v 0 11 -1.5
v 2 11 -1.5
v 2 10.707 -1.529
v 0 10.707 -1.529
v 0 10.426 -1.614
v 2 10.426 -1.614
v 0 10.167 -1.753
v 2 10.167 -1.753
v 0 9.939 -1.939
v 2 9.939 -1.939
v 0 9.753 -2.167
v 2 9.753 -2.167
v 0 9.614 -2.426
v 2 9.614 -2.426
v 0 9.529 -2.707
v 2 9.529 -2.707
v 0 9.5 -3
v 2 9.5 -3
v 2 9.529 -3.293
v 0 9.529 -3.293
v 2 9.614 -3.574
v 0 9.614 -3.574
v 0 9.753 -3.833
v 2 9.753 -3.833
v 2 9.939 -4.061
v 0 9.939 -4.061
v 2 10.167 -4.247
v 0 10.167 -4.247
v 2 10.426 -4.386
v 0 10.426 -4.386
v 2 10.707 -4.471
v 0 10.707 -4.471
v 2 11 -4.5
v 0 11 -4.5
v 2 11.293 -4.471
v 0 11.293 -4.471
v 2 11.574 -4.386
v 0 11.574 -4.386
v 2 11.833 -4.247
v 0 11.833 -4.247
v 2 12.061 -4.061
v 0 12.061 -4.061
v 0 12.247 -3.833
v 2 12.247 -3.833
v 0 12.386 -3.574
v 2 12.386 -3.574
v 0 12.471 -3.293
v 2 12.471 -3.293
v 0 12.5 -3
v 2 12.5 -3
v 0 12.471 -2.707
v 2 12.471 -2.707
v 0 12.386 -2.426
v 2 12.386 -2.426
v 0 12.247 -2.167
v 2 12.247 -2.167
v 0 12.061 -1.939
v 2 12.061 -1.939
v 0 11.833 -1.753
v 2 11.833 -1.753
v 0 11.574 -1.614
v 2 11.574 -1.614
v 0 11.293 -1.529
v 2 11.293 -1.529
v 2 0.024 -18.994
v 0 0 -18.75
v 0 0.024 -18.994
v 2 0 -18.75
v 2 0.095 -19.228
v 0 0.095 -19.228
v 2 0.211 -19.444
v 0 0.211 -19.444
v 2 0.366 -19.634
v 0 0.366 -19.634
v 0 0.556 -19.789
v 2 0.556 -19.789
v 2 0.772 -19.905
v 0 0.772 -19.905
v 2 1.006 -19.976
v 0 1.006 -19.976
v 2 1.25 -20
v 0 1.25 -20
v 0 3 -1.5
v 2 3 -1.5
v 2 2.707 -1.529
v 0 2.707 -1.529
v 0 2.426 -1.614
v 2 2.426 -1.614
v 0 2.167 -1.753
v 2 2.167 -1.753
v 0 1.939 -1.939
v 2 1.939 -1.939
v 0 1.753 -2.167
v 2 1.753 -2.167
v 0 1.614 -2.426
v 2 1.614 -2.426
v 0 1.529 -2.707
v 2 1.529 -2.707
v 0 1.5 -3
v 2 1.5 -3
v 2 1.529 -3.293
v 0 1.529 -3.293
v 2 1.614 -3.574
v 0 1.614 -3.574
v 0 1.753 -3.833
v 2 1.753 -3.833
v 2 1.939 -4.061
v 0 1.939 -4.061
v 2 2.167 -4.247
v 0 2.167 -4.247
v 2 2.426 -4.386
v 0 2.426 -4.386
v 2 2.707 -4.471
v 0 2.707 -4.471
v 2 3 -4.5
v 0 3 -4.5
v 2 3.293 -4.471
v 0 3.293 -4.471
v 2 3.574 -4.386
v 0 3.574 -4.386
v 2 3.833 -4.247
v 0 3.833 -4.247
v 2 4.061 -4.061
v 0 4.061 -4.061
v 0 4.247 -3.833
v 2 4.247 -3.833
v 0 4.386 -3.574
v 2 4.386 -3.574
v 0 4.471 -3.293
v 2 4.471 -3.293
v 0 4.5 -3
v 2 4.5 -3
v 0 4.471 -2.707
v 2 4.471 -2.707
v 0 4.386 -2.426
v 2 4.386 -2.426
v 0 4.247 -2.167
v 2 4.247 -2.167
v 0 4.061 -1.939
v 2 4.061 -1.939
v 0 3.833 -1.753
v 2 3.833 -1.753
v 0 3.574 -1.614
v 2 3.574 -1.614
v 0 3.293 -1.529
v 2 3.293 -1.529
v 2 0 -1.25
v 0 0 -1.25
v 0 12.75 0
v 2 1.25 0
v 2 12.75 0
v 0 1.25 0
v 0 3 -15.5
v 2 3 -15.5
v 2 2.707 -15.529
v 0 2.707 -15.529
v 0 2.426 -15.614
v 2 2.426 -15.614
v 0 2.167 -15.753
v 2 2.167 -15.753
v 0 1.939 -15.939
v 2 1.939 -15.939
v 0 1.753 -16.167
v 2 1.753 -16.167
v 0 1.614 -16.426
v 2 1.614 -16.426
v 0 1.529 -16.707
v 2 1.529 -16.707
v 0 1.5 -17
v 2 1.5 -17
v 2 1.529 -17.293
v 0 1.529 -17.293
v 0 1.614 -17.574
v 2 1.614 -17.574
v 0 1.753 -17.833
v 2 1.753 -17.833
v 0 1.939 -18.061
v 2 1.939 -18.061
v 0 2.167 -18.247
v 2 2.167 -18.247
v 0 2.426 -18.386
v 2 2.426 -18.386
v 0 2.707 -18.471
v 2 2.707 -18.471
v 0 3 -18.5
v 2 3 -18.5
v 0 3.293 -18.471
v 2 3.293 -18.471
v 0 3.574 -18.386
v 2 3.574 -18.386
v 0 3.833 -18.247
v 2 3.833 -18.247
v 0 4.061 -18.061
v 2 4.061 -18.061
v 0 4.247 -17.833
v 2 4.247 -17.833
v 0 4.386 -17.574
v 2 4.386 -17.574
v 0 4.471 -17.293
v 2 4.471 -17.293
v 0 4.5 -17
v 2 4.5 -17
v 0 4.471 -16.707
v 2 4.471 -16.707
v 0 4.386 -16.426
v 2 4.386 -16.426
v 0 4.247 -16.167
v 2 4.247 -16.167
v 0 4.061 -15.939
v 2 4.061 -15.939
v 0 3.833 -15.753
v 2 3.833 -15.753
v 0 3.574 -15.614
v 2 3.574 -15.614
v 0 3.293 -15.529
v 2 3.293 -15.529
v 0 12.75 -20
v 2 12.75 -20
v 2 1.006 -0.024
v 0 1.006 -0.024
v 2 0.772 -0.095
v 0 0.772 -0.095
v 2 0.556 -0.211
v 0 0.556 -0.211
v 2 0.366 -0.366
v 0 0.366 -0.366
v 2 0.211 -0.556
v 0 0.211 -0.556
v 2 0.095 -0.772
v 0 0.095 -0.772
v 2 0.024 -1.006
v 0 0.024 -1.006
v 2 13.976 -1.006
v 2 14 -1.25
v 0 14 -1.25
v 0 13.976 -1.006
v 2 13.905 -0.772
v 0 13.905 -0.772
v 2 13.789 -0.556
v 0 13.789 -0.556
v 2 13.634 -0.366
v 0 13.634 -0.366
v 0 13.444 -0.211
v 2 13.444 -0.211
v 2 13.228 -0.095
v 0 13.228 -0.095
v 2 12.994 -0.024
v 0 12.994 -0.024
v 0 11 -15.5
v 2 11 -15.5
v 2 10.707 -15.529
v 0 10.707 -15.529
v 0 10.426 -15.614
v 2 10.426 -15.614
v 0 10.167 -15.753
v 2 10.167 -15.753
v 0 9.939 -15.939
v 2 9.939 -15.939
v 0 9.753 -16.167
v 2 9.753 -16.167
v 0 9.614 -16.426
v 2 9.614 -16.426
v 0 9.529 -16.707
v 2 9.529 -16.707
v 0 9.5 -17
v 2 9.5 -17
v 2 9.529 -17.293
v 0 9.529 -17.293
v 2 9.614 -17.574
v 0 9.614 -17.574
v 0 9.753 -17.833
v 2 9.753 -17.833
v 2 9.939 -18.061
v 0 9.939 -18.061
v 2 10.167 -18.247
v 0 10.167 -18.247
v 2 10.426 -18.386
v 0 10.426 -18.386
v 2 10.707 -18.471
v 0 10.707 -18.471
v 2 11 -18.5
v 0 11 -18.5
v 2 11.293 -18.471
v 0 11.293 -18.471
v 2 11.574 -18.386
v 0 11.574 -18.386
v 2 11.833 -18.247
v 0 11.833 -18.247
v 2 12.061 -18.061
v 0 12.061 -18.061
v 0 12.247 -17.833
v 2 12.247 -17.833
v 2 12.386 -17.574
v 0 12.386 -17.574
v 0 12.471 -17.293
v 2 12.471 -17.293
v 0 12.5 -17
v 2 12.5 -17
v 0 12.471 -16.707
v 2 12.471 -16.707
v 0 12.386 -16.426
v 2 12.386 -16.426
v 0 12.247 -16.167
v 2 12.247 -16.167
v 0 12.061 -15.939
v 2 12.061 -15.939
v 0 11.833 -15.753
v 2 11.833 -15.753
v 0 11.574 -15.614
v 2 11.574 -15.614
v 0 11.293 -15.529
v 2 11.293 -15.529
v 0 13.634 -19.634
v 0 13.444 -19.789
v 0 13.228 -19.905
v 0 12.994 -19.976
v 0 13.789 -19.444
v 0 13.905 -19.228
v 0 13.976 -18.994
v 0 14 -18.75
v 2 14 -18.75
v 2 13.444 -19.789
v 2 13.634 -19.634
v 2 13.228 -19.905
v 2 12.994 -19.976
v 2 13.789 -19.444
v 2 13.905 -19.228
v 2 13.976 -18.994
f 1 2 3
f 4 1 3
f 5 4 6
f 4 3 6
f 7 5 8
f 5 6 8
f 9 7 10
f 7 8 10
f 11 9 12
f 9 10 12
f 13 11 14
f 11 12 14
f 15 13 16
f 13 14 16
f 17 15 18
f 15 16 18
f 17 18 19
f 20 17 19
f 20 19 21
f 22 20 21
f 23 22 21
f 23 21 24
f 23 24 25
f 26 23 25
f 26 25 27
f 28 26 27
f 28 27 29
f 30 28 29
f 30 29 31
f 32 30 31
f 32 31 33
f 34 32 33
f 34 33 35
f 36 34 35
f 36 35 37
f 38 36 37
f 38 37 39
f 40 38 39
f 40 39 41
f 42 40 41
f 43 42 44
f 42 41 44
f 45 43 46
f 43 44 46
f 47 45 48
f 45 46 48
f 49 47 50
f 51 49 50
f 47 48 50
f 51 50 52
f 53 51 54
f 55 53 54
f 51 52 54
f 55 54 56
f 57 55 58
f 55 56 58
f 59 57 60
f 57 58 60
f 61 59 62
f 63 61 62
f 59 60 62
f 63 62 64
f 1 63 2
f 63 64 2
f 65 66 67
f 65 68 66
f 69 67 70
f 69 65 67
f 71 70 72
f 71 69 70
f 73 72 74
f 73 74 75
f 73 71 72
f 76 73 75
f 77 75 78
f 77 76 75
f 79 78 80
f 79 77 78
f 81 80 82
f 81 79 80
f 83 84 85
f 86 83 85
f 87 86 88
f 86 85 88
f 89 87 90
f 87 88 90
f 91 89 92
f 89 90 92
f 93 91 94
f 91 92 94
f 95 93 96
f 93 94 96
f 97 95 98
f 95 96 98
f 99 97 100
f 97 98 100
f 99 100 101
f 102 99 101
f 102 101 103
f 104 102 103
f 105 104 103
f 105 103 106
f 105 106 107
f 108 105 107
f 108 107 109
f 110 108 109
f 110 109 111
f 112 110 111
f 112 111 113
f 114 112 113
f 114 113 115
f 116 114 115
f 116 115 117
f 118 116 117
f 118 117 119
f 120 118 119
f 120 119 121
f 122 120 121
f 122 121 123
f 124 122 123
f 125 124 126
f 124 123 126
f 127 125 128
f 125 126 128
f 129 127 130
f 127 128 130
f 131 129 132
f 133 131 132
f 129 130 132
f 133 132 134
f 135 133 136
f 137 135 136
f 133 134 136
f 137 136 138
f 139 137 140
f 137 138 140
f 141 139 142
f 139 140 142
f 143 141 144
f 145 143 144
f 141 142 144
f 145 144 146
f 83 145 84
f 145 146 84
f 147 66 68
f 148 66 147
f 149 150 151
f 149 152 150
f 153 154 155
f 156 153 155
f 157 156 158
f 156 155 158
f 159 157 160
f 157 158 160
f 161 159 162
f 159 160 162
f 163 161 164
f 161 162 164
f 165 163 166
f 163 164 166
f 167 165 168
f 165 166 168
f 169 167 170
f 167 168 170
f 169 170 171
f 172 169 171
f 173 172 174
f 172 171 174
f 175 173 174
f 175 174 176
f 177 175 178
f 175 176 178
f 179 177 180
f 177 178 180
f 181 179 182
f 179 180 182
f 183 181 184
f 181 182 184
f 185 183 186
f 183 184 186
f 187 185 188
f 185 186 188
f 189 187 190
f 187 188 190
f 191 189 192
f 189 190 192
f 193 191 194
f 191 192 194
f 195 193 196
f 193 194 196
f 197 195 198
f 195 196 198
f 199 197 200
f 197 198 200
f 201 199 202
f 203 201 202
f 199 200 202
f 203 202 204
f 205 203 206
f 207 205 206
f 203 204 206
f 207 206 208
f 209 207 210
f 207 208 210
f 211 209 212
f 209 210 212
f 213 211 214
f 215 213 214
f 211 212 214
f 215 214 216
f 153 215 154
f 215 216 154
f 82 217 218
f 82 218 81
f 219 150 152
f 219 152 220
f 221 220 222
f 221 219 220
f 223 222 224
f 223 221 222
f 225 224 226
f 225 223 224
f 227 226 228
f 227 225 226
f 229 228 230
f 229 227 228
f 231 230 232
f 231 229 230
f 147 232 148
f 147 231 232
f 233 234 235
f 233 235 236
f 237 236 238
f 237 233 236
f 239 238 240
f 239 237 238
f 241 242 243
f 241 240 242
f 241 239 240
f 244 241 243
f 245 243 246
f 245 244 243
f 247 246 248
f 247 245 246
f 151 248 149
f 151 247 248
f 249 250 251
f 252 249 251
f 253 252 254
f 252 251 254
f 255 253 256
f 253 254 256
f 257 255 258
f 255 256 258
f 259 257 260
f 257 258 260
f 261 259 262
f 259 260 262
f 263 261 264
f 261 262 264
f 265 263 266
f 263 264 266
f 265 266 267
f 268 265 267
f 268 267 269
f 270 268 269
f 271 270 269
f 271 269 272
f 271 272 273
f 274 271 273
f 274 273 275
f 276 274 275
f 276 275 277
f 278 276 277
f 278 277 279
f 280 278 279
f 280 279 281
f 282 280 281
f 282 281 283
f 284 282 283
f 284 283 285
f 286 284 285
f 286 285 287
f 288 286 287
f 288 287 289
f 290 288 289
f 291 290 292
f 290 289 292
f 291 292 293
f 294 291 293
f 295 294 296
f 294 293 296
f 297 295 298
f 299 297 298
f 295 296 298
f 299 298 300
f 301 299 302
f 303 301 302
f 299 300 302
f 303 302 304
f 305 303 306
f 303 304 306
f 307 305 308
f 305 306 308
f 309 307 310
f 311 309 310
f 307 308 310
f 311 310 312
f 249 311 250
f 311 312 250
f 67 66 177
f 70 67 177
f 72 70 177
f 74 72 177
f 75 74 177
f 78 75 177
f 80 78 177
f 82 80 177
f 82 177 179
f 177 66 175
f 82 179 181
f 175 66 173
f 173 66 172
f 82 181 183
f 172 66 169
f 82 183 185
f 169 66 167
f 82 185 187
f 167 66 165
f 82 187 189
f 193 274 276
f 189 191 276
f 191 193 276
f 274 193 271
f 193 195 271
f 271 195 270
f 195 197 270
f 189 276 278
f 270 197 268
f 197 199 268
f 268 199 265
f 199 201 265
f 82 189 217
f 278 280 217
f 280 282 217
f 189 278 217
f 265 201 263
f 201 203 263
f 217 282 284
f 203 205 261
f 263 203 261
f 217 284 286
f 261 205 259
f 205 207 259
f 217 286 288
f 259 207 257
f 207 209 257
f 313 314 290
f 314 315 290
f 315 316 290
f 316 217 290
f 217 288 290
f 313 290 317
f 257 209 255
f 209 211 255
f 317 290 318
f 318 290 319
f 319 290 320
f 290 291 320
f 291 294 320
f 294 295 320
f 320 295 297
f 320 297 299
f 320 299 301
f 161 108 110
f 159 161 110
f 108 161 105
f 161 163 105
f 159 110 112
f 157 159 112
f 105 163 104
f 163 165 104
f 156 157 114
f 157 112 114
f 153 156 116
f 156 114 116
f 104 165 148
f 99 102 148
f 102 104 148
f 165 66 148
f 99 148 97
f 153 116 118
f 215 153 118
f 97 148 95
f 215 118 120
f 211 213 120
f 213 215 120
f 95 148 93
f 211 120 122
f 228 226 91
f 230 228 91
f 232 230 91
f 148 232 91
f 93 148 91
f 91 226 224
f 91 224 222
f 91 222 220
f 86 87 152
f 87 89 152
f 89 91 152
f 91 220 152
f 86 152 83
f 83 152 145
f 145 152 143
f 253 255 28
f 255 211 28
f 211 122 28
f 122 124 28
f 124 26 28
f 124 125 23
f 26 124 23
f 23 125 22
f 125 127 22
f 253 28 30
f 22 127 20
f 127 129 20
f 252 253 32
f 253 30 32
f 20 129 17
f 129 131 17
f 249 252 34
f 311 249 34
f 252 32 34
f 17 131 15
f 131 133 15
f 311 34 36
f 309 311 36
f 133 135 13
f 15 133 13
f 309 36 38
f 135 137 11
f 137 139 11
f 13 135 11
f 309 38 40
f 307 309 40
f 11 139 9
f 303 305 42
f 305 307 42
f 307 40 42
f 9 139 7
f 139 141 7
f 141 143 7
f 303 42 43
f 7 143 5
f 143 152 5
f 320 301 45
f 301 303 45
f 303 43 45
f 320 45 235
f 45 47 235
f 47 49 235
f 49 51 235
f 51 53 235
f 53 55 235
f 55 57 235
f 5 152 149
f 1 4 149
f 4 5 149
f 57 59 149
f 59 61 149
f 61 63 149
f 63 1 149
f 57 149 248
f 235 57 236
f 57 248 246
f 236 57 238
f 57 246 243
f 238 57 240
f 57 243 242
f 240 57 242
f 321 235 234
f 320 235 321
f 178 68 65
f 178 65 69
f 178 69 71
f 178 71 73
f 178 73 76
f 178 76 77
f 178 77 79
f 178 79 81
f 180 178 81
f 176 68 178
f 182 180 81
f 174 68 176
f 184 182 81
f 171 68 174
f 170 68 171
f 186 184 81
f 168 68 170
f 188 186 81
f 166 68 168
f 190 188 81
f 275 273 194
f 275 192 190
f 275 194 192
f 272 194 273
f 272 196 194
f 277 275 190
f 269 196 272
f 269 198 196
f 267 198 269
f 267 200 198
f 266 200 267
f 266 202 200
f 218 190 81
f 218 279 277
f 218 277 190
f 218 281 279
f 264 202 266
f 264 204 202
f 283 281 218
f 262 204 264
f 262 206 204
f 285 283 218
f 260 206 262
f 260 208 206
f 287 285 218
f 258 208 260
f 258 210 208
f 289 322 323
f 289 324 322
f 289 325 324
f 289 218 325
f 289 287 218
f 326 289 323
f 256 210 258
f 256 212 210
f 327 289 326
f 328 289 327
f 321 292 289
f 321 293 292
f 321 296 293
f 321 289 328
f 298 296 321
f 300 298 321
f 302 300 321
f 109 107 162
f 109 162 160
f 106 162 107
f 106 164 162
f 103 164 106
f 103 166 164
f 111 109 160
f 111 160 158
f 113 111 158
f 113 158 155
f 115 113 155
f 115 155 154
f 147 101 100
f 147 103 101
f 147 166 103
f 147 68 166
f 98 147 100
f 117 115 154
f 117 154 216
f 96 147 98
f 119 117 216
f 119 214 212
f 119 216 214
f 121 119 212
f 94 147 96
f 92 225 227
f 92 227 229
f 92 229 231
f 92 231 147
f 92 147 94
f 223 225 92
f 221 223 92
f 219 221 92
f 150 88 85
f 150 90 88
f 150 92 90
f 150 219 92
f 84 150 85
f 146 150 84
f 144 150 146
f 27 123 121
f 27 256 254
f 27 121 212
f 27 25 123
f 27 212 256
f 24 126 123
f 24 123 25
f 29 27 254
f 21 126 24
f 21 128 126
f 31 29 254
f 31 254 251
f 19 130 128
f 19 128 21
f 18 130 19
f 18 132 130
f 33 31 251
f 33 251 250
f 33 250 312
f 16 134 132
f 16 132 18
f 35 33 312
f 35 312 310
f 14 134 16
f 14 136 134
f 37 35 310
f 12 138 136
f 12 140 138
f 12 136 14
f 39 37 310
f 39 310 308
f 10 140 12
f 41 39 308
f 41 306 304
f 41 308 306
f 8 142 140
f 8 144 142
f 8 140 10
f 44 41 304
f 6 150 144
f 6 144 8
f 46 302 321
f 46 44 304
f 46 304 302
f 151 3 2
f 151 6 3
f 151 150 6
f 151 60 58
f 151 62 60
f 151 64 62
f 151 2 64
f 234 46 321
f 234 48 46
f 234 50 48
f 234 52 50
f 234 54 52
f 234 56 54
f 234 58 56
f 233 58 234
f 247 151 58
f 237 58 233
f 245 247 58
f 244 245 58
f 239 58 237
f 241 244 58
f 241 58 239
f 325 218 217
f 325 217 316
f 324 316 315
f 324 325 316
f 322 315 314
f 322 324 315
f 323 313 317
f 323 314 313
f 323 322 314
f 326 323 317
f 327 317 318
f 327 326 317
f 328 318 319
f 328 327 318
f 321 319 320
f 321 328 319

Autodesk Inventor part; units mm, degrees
ref_plane "YZ Plane" through (0, 0, 0) normal (1, 0, 0) x (0, 1, 0)
ref_plane "XZ Plane" through (0, 0, 0) normal (0, 1, 0) x (-1, 0, 0)
ref_plane "XY Plane" through (0, 0, 0) normal (0, 0, 1) x (1, 0, 0)
sketch "Sketch1" plane through (0, 0, 0) normal (1, 0, 0) x (0, 1, 0)
  line L0 (0, 0) -> (14, 0)
  line L1 (14, 0) -> (14, -20)
  line L2 (14, -20) -> (0, -20)
  line L3 (0, -20) -> (0, 0)
  line L4 (14, -10) -> (0, -10)
  point P0 (11, -3)
  point P1 (3, -3)
  point P2 (11, -17)
  point P3 (3, -17)
  dimension "d0" = 14
  dimension "d1" = 20
  dimension "d2" = 8
  dimension "d3" = 3
  dimension "d4" = 3
  dimension "d5" = 3
extrude "Extrusion1" add sketch "Sketch1" along normal blind 2
hole "Hole1" at (0, 11, -3) at (0, 3, -3) at (0, 11, -17) at (0, 3, -17) direction (1, 0, 0) diameter 3 depth 80.45
fillet "Fillet1" radius 1.25 4 edges at (1, 14, 0) (1, 14, -20) (1, 0, -20) (1, 0, 0)
properties part number "belt_holder_2" material "アルミニウム 6061"
